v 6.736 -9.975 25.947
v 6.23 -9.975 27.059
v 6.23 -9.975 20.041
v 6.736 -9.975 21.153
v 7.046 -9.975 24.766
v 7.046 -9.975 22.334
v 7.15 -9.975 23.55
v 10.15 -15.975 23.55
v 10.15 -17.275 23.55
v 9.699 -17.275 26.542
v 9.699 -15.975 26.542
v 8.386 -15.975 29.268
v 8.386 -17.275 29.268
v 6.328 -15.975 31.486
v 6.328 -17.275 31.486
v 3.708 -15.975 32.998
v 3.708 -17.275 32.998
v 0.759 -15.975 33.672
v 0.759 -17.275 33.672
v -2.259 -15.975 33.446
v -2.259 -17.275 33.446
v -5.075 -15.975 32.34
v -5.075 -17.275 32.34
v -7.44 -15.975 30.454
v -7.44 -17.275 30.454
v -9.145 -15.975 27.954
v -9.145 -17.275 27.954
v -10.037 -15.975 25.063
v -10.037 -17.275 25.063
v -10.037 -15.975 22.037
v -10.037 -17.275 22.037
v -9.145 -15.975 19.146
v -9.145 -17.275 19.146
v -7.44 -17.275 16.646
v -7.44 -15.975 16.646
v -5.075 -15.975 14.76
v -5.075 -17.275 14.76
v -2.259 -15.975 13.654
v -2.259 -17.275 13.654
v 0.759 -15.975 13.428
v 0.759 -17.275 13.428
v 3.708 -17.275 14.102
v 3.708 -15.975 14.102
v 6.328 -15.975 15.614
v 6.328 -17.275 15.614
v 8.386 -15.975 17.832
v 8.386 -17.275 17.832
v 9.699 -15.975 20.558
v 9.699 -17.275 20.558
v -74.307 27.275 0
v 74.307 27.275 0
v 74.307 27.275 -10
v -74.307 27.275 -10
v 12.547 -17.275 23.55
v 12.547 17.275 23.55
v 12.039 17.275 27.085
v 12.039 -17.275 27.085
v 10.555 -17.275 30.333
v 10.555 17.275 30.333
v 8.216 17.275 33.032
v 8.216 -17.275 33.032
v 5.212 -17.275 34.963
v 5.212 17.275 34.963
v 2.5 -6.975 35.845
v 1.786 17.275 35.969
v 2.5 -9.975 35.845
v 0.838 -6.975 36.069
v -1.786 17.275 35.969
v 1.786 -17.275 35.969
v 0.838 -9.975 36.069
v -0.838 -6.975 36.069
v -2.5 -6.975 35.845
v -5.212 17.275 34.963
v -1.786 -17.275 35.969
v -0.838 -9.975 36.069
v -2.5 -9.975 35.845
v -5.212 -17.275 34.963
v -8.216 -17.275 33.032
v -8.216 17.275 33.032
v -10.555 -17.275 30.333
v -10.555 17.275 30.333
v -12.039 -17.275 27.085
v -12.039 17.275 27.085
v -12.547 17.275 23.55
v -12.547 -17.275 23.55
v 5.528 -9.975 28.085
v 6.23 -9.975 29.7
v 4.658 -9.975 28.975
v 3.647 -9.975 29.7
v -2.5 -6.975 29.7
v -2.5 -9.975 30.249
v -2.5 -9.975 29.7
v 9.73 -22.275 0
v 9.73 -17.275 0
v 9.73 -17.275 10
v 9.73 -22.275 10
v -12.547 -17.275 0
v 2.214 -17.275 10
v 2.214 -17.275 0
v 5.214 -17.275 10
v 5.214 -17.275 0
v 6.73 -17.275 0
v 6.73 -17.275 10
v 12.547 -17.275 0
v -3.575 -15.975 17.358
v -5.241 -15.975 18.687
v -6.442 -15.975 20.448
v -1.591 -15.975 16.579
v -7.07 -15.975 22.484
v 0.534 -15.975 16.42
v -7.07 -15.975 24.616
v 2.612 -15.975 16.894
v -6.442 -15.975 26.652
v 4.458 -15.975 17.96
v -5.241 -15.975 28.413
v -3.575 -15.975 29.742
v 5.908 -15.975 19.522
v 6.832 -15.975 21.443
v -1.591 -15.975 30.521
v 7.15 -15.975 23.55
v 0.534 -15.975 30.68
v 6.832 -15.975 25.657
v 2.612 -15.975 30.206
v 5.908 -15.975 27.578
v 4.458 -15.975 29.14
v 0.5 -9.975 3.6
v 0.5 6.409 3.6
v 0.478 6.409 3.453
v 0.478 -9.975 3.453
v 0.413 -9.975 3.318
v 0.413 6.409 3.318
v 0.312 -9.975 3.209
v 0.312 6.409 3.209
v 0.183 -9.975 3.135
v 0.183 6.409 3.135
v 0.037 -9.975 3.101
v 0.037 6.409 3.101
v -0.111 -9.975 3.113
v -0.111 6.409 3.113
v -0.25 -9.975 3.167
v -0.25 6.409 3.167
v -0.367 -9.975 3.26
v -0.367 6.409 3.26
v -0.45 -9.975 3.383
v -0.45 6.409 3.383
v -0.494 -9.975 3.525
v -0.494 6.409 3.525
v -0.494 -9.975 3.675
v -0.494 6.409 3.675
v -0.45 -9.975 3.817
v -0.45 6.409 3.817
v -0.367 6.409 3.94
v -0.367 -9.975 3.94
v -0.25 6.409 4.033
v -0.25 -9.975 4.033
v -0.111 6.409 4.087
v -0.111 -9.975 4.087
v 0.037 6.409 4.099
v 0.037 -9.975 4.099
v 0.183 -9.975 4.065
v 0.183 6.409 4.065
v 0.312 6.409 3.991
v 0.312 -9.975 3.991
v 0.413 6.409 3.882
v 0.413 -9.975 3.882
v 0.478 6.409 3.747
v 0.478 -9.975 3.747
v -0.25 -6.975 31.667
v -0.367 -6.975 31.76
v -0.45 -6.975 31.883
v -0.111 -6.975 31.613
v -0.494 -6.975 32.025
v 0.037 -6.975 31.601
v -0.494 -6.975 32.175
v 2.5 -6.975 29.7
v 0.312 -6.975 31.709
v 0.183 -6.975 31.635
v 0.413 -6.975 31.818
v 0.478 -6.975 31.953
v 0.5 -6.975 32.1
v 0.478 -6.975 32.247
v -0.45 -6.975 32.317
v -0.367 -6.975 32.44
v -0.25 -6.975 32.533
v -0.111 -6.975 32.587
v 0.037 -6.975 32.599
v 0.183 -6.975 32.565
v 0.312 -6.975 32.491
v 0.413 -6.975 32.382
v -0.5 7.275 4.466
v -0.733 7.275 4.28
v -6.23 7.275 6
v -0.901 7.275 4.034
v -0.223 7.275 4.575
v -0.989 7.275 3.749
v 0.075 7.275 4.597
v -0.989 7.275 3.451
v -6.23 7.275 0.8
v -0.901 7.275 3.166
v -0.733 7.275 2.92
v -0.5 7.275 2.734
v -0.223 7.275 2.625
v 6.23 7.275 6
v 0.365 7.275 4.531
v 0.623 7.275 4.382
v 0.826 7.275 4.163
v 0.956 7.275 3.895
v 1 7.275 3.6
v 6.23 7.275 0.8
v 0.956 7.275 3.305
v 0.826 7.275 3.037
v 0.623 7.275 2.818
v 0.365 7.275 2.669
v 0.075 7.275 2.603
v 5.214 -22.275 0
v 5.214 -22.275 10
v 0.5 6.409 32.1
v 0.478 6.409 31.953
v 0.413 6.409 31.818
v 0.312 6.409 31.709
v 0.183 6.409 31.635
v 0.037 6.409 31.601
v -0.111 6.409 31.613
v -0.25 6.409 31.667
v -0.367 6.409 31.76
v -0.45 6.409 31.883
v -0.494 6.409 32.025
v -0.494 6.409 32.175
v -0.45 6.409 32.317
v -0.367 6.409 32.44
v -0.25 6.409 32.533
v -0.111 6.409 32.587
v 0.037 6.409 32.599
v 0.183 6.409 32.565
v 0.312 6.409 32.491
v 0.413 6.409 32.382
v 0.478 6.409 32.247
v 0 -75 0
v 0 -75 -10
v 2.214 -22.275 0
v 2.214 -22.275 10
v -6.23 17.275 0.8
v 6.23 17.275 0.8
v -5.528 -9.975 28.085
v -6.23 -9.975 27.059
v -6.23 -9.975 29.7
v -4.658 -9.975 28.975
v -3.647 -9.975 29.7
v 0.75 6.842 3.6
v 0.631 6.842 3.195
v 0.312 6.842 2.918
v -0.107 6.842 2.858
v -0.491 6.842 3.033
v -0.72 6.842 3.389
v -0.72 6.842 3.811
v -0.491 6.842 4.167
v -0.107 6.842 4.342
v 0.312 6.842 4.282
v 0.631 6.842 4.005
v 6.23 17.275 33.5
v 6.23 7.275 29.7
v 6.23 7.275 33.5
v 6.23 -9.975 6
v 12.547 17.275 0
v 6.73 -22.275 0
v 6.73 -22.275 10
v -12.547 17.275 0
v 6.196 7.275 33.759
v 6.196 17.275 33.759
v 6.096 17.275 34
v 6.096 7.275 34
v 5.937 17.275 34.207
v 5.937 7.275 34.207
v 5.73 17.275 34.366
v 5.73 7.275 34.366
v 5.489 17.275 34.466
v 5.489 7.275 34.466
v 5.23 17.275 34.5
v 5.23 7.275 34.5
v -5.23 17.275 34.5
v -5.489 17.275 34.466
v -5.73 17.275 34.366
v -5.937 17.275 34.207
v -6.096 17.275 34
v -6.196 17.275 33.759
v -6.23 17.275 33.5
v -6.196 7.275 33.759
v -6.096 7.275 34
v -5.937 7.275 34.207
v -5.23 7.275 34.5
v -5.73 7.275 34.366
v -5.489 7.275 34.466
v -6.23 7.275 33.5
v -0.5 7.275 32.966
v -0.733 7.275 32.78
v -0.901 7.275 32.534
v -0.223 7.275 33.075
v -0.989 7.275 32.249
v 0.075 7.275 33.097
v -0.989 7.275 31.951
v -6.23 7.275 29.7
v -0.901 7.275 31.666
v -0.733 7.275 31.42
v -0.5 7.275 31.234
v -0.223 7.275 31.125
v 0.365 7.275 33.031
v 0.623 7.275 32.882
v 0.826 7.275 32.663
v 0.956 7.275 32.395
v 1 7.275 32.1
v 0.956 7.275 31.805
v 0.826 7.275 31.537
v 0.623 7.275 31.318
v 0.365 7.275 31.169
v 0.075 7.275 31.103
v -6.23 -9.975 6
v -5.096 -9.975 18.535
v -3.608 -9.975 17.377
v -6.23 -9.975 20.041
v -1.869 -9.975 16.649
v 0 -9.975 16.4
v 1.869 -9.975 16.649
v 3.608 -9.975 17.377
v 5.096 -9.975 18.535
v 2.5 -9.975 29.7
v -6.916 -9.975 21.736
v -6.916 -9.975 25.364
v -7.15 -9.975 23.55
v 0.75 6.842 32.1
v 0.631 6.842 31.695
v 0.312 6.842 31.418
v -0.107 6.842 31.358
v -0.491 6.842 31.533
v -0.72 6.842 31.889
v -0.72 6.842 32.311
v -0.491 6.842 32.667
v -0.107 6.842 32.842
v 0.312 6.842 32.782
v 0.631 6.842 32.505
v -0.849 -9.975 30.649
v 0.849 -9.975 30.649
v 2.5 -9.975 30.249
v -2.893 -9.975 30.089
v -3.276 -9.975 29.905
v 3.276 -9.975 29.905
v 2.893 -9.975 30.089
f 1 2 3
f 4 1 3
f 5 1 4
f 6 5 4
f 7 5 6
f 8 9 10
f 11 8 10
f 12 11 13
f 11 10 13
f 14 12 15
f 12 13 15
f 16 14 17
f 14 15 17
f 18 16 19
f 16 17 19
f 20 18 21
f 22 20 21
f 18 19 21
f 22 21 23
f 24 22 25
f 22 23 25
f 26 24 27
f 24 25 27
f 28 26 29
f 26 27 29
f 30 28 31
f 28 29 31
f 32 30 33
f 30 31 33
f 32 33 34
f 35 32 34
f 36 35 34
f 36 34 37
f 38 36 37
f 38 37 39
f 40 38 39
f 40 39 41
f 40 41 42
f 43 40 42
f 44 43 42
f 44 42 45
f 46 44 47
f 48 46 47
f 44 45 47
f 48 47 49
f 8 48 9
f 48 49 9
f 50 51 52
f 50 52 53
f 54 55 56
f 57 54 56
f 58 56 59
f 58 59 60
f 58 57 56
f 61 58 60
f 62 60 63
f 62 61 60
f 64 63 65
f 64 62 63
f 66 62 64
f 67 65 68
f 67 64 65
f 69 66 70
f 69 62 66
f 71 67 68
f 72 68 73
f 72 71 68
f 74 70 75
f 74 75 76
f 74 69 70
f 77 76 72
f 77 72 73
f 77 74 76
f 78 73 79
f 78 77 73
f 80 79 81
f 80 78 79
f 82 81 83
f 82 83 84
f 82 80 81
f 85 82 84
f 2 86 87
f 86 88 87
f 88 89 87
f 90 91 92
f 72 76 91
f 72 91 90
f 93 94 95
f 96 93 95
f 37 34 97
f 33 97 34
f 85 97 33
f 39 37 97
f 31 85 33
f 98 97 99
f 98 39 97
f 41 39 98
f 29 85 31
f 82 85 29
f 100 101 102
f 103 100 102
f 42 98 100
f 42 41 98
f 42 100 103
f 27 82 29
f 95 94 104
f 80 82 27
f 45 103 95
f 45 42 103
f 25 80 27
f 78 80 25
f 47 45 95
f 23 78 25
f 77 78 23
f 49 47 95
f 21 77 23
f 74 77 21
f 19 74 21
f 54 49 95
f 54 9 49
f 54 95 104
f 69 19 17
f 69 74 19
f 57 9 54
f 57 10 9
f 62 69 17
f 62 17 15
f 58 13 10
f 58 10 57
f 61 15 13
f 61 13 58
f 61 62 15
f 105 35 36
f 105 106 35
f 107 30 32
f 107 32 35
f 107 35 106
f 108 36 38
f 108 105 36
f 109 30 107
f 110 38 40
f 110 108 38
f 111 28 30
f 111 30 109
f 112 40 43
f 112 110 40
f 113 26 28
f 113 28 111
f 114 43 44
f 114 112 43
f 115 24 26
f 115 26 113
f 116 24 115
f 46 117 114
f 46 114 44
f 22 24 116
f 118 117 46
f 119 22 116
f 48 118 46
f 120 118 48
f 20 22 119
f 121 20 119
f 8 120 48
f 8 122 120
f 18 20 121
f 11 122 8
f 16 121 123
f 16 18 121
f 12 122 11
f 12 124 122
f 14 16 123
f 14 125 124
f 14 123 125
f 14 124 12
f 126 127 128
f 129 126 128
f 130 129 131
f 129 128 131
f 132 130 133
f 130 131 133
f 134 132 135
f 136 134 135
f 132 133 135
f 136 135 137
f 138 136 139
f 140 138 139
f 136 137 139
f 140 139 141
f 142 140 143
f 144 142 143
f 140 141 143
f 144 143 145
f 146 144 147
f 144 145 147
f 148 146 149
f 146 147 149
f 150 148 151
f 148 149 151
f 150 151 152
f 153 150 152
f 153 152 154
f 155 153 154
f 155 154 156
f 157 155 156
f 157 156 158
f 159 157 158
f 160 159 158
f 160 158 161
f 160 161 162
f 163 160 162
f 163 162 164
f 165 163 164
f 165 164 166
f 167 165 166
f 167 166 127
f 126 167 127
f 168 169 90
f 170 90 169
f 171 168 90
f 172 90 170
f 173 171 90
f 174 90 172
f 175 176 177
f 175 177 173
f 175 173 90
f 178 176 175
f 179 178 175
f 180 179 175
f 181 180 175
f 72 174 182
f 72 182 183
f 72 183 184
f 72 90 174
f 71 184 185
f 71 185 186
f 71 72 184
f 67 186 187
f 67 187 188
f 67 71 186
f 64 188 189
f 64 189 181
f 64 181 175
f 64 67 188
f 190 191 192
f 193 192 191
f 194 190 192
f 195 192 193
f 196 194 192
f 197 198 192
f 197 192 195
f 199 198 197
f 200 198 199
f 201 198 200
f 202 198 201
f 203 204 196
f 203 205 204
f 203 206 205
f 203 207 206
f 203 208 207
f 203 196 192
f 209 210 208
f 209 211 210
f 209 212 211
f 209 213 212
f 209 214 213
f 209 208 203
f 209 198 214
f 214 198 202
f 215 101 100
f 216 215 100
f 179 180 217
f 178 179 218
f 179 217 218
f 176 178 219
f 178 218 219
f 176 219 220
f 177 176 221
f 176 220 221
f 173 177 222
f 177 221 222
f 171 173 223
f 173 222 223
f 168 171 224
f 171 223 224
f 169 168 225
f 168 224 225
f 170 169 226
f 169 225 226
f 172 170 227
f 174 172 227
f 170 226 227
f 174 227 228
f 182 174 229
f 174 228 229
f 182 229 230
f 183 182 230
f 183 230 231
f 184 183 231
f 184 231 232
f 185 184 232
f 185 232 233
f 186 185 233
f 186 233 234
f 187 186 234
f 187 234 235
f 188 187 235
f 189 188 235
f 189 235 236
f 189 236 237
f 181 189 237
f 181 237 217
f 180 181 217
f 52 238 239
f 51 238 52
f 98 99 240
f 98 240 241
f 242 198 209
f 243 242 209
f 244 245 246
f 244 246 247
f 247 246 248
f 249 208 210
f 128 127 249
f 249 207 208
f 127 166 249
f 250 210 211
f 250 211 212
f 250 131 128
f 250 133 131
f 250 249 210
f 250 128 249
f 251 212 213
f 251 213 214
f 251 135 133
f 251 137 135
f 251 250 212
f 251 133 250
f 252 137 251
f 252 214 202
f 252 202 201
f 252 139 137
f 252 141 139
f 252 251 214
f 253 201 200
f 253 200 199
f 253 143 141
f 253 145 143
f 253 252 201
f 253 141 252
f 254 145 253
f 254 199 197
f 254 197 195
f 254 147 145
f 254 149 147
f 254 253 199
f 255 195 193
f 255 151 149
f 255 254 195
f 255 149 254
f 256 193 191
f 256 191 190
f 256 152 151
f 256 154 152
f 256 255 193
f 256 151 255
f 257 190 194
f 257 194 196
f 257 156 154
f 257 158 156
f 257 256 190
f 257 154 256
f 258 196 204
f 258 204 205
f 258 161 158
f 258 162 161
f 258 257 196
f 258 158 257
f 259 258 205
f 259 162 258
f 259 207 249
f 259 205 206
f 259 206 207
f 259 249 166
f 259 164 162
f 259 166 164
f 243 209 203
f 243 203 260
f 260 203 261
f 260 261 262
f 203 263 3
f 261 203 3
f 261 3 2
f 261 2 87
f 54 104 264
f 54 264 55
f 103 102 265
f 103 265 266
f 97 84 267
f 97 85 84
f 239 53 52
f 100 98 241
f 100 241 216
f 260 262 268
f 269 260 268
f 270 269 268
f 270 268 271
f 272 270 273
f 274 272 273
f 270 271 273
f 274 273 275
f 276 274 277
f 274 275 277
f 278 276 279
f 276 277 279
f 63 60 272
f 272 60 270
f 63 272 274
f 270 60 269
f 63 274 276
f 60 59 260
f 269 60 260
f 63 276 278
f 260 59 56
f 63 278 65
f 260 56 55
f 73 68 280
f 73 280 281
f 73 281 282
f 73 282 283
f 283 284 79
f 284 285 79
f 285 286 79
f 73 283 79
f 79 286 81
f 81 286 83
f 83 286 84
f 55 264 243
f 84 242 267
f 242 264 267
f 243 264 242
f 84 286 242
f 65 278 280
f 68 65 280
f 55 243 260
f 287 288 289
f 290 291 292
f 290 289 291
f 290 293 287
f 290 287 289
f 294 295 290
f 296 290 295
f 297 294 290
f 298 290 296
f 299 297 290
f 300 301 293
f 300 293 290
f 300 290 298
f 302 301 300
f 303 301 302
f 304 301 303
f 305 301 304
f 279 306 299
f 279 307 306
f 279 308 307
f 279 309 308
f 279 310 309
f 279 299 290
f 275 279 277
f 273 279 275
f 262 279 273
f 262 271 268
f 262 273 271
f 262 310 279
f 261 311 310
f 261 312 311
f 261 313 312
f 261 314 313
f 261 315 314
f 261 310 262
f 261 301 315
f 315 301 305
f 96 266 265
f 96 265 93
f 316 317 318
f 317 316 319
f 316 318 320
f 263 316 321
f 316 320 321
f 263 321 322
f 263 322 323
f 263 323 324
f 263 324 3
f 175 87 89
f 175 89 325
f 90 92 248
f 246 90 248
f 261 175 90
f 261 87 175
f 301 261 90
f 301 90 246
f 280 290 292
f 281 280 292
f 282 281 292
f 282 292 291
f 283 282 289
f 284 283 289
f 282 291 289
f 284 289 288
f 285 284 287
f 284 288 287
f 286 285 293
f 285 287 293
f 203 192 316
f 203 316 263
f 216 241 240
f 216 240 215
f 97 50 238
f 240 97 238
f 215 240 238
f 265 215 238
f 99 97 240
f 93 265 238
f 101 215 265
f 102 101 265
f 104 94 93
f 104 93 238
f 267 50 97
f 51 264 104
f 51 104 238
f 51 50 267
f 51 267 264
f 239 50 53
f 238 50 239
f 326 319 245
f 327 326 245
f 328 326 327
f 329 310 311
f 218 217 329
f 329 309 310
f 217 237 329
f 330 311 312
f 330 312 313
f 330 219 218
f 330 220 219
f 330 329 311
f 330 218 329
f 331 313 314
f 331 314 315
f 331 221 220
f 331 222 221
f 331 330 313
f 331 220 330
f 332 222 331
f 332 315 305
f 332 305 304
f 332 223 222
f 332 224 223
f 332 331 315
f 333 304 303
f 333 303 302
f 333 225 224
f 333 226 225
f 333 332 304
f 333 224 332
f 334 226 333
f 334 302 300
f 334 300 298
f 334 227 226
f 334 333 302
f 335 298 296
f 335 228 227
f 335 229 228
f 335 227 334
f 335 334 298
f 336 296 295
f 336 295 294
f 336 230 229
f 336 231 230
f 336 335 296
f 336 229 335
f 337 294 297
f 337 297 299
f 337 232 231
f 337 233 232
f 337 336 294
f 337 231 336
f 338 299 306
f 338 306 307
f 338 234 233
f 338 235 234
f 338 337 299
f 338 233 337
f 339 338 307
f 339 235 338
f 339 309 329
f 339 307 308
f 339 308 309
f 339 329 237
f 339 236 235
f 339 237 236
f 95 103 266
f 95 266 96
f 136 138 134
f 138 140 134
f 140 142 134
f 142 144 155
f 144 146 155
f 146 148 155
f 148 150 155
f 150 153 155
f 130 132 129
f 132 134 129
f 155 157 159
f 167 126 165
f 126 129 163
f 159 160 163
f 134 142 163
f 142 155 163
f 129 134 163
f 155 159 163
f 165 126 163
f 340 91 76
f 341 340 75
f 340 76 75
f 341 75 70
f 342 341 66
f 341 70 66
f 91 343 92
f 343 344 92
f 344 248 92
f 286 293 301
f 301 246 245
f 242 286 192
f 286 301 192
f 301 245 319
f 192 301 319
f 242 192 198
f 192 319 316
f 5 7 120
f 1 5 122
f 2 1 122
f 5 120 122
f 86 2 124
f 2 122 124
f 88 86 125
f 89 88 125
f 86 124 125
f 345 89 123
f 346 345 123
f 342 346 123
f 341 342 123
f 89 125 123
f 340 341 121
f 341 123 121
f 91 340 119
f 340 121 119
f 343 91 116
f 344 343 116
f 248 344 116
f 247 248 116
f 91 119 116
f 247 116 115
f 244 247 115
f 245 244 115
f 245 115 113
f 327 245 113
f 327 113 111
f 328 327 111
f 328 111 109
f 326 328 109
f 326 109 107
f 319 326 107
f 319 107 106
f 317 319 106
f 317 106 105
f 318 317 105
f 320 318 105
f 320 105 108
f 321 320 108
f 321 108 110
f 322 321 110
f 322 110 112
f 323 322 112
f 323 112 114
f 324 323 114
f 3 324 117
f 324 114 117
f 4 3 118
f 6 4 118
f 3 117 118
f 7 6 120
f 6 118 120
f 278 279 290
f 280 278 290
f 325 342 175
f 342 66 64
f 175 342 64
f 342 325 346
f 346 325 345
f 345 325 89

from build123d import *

# Parameters (mm, degrees)
SKETCH4_W                = 12.46
SKETCH4_H                = 17.25
BOSS_EXTRUDE3_DEPTH      = 6
SKETCH8_R                = 12.546781182
SKETCH8_R_2              = 11.15
BOSS_EXTRUDE6_DEPTH      = 7.3
BOSS_EXTRUDE6_DEPTH_BACK = 17.25
BOSS_EXTRUDE4_DEPTH      = 17.25
SKETCH6_R                = 0.5
CUT_EXTRUDE1_DEPTH       = 20
CHAMFER1_SIZE            = 0.5
CHAMFER1_SIZE2           = 0.866025404
SKETCH10_W               = 12.46
SKETCH10_H               = 23.7
CUT_EXTRUDE3_DEPTH       = 17.25
CUT_EXTRUDE4_REACH       = 38.097
SKETCH11_W               = 5
SKETCH11_H               = 3
BOSS_EXTRUDE7_DEPTH      = 7.3
BOSS_EXTRUDE9_DEPTH      = 10
SKETCH16_R               = 11.15
SKETCH16_R_2             = 7.15
BOSS_EXTRUDE10_DEPTH     = 7.3
SKETCH17_R               = 10.15
SKETCH17_R_2             = 7.15
CUT_EXTRUDE5_DEPTH       = 1.3
SKETCH18_W               = 3
SKETCH18_H               = 10
BOSS_EXTRUDE11_DEPTH     = 5
OFFSET_R_DEPTH           = 10


with BuildPart() as part:
    # Sketch4 → Boss-Extrude3 (new body)
    with BuildSketch(Plane.XY):
        with Locations((0, -1.35)):
            Rectangle(SKETCH4_W, SKETCH4_H)
    extrude(amount=BOSS_EXTRUDE3_DEPTH)



with BuildPart() as body_2:
    # Sketch8 → Boss-Extrude6 (new body, two sides)
    with BuildSketch(Plane(origin=(0, -9.975, 0), x_dir=(-1, 0, 0), z_dir=(0, -1, 0))) as boss_extrude6_sk:
        with Locations((0, -23.55)):
            Circle(SKETCH8_R)
        with Locations((0, -23.55)):
            Circle(SKETCH8_R_2, mode=Mode.SUBTRACT)
    extrude(amount=BOSS_EXTRUDE6_DEPTH)
    extrude(boss_extrude6_sk.sketch, amount=-BOSS_EXTRUDE6_DEPTH_BACK)


with BuildPart() as part_1:
    add(part.part)

    add(body_2.part)  # Boss-Extrude4 merges body 2
    # Sketch5 → Boss-Extrude4 (add)
    with BuildSketch(Plane(origin=(0, 7.275, 0), x_dir=(1, 0, 0), z_dir=(0, 1, 0))):
        with BuildLine():
            Line((12.546781182, -23.55), (12.546781182, 0))
            Line((12.546781182, 0), (6.23, 0))
            Line((6.23, 0), (6.23, -29.7))
            Line((6.23, -29.7), (-6.23, -29.7))
            Line((-6.23, -29.7), (-6.23, 0))
            Line((-6.23, 0), (-12.546781182, 0))
            Line((-12.546781182, 0), (-12.546781182, -23.55))
            ThreePointArc((-12.546781182, -23.55), (0, -36.096781182), (12.546781182, -23.55))
        make_face()
    extrude(amount=-BOSS_EXTRUDE4_DEPTH)

    # Sketch6 → Cut-Extrude1 (cut)
    with BuildSketch(Plane(origin=(0, 7.275, 0), x_dir=(1, 0, 0), z_dir=(0, 1, 0))):
        with Locations((0, -3.6)):
            Circle(SKETCH6_R)
        with Locations((0, -32.1)):
            Circle(SKETCH6_R)
    extrude(amount=-CUT_EXTRUDE1_DEPTH, mode=Mode.SUBTRACT)

    # Chamfer1
    chamfer1_edges = [part_1.edges().sort_by_distance(p)[0] for p in [
        (-0.5, 7.275, 3.6),
        (-0.5, 7.275, 32.1),
    ]]
    chamfer1_side = [part_1.faces().sort_by_distance(p)[0] for p in [
        (0, 7.275, 35.657160381),
    ]]
    chamfer(chamfer1_edges, length=CHAMFER1_SIZE, length2=CHAMFER1_SIZE2, reference=chamfer1_side[0])

    # Sketch10 → Cut-Extrude3 (cut)
    with BuildSketch(Plane(origin=(0, 7.275, 0), x_dir=(1, 0, 0), z_dir=(0, 1, 0))):
        with Locations((0, -17.85)):
            Rectangle(SKETCH10_W, SKETCH10_H)
    extrude(amount=-CUT_EXTRUDE3_DEPTH, mode=Mode.SUBTRACT)

    # Sketch11 → Cut-Extrude4 (cut, up to next)
    with BuildSketch(Plane.XY.offset(36.096781182), mode=Mode.PRIVATE) as cut_extrude4_sk1:
        with Locations((0, -8.475)):
            Rectangle(SKETCH11_W, SKETCH11_H)
    cut_extrude4_tool1 = extrude(cut_extrude4_sk1.sketch, amount=-CUT_EXTRUDE4_REACH, mode=Mode.PRIVATE) & part_1.part
    add(cut_extrude4_tool1.solids().sort_by_distance((0, -8.475, 36.096781))[0], mode=Mode.SUBTRACT)

    # Sketch13 → Boss-Extrude7 (add)
    with BuildSketch(Plane.XZ.offset(17.275)):
        with BuildLine():
            Line((-12.546781182, 23.55), (-12.546781182, 0))
            Line((-12.546781182, 0), (12.546781182, 0))
            Line((12.546781182, 0), (12.546781182, 23.55))
            ThreePointArc((12.546781182, 23.55), (0, 11.003218818), (-12.546781182, 23.55))
        make_face()
    extrude(amount=-BOSS_EXTRUDE7_DEPTH)

    # Sketch15 → Boss-Extrude9 (add)
    with BuildSketch(Plane(origin=(0, 7.275, 0), x_dir=(1, 0, 0), z_dir=(0, 1, 0))):
        with BuildLine():
            Line((-12.546781182, 0), (12.546781182, 0))
            Line((12.546781182, 0), (12.546781182, -23.55))
            ThreePointArc((12.546781182, -23.55), (0, -36.096781182), (-12.546781182, -23.55))
            Line((-12.546781182, -23.55), (-12.546781182, 0))
        make_face()
        with BuildLine():
            Line((-6.23, -0.8), (6.23, -0.8))
            Line((6.23, -0.8), (6.23, -33.5))
            ThreePointArc((6.23, -33.5), (5.937106781, -34.207106781), (5.23, -34.5))
            Line((5.23, -34.5), (-5.23, -34.5))
            ThreePointArc((-5.23, -34.5), (-5.937106781, -34.207106781), (-6.23, -33.5))
            Line((-6.23, -33.5), (-6.23, -0.8))
        make_face(mode=Mode.SUBTRACT)
    extrude(amount=BOSS_EXTRUDE9_DEPTH)

    # Sketch16 → Boss-Extrude10 (add)
    with BuildSketch(Plane.XZ.offset(17.275)):
        with Locations((0, 23.55)):
            Circle(SKETCH16_R)
        with Locations((0, 23.55)):
            Circle(SKETCH16_R_2, mode=Mode.SUBTRACT)
    extrude(amount=-BOSS_EXTRUDE10_DEPTH)

    # Sketch17 → Cut-Extrude5 (cut)
    with BuildSketch(Plane.XZ.offset(17.275)):
        with Locations((0, 23.55)):
            Circle(SKETCH17_R)
        with Locations((0, 23.55)):
            Circle(SKETCH17_R_2, mode=Mode.SUBTRACT)
    extrude(amount=-CUT_EXTRUDE5_DEPTH, mode=Mode.SUBTRACT)

    # Sketch18 → Boss-Extrude11 (add)
    with BuildSketch(Plane.XZ.offset(17.275)):
        with Locations((8.23, 5)):
            Rectangle(SKETCH18_W, SKETCH18_H)
        with Locations((3.714, 5)):
            Rectangle(SKETCH18_W, SKETCH18_H)
    extrude(amount=BOSS_EXTRUDE11_DEPTH)

    # Sketch1 → Offset R (add)
    with BuildSketch(Plane.XY):
        Polygon((0, -75), (74.307137052, 27.275), (-74.307137052, 27.275), align=None)
    extrude(amount=-OFFSET_R_DEPTH)


solid = part_1.part
